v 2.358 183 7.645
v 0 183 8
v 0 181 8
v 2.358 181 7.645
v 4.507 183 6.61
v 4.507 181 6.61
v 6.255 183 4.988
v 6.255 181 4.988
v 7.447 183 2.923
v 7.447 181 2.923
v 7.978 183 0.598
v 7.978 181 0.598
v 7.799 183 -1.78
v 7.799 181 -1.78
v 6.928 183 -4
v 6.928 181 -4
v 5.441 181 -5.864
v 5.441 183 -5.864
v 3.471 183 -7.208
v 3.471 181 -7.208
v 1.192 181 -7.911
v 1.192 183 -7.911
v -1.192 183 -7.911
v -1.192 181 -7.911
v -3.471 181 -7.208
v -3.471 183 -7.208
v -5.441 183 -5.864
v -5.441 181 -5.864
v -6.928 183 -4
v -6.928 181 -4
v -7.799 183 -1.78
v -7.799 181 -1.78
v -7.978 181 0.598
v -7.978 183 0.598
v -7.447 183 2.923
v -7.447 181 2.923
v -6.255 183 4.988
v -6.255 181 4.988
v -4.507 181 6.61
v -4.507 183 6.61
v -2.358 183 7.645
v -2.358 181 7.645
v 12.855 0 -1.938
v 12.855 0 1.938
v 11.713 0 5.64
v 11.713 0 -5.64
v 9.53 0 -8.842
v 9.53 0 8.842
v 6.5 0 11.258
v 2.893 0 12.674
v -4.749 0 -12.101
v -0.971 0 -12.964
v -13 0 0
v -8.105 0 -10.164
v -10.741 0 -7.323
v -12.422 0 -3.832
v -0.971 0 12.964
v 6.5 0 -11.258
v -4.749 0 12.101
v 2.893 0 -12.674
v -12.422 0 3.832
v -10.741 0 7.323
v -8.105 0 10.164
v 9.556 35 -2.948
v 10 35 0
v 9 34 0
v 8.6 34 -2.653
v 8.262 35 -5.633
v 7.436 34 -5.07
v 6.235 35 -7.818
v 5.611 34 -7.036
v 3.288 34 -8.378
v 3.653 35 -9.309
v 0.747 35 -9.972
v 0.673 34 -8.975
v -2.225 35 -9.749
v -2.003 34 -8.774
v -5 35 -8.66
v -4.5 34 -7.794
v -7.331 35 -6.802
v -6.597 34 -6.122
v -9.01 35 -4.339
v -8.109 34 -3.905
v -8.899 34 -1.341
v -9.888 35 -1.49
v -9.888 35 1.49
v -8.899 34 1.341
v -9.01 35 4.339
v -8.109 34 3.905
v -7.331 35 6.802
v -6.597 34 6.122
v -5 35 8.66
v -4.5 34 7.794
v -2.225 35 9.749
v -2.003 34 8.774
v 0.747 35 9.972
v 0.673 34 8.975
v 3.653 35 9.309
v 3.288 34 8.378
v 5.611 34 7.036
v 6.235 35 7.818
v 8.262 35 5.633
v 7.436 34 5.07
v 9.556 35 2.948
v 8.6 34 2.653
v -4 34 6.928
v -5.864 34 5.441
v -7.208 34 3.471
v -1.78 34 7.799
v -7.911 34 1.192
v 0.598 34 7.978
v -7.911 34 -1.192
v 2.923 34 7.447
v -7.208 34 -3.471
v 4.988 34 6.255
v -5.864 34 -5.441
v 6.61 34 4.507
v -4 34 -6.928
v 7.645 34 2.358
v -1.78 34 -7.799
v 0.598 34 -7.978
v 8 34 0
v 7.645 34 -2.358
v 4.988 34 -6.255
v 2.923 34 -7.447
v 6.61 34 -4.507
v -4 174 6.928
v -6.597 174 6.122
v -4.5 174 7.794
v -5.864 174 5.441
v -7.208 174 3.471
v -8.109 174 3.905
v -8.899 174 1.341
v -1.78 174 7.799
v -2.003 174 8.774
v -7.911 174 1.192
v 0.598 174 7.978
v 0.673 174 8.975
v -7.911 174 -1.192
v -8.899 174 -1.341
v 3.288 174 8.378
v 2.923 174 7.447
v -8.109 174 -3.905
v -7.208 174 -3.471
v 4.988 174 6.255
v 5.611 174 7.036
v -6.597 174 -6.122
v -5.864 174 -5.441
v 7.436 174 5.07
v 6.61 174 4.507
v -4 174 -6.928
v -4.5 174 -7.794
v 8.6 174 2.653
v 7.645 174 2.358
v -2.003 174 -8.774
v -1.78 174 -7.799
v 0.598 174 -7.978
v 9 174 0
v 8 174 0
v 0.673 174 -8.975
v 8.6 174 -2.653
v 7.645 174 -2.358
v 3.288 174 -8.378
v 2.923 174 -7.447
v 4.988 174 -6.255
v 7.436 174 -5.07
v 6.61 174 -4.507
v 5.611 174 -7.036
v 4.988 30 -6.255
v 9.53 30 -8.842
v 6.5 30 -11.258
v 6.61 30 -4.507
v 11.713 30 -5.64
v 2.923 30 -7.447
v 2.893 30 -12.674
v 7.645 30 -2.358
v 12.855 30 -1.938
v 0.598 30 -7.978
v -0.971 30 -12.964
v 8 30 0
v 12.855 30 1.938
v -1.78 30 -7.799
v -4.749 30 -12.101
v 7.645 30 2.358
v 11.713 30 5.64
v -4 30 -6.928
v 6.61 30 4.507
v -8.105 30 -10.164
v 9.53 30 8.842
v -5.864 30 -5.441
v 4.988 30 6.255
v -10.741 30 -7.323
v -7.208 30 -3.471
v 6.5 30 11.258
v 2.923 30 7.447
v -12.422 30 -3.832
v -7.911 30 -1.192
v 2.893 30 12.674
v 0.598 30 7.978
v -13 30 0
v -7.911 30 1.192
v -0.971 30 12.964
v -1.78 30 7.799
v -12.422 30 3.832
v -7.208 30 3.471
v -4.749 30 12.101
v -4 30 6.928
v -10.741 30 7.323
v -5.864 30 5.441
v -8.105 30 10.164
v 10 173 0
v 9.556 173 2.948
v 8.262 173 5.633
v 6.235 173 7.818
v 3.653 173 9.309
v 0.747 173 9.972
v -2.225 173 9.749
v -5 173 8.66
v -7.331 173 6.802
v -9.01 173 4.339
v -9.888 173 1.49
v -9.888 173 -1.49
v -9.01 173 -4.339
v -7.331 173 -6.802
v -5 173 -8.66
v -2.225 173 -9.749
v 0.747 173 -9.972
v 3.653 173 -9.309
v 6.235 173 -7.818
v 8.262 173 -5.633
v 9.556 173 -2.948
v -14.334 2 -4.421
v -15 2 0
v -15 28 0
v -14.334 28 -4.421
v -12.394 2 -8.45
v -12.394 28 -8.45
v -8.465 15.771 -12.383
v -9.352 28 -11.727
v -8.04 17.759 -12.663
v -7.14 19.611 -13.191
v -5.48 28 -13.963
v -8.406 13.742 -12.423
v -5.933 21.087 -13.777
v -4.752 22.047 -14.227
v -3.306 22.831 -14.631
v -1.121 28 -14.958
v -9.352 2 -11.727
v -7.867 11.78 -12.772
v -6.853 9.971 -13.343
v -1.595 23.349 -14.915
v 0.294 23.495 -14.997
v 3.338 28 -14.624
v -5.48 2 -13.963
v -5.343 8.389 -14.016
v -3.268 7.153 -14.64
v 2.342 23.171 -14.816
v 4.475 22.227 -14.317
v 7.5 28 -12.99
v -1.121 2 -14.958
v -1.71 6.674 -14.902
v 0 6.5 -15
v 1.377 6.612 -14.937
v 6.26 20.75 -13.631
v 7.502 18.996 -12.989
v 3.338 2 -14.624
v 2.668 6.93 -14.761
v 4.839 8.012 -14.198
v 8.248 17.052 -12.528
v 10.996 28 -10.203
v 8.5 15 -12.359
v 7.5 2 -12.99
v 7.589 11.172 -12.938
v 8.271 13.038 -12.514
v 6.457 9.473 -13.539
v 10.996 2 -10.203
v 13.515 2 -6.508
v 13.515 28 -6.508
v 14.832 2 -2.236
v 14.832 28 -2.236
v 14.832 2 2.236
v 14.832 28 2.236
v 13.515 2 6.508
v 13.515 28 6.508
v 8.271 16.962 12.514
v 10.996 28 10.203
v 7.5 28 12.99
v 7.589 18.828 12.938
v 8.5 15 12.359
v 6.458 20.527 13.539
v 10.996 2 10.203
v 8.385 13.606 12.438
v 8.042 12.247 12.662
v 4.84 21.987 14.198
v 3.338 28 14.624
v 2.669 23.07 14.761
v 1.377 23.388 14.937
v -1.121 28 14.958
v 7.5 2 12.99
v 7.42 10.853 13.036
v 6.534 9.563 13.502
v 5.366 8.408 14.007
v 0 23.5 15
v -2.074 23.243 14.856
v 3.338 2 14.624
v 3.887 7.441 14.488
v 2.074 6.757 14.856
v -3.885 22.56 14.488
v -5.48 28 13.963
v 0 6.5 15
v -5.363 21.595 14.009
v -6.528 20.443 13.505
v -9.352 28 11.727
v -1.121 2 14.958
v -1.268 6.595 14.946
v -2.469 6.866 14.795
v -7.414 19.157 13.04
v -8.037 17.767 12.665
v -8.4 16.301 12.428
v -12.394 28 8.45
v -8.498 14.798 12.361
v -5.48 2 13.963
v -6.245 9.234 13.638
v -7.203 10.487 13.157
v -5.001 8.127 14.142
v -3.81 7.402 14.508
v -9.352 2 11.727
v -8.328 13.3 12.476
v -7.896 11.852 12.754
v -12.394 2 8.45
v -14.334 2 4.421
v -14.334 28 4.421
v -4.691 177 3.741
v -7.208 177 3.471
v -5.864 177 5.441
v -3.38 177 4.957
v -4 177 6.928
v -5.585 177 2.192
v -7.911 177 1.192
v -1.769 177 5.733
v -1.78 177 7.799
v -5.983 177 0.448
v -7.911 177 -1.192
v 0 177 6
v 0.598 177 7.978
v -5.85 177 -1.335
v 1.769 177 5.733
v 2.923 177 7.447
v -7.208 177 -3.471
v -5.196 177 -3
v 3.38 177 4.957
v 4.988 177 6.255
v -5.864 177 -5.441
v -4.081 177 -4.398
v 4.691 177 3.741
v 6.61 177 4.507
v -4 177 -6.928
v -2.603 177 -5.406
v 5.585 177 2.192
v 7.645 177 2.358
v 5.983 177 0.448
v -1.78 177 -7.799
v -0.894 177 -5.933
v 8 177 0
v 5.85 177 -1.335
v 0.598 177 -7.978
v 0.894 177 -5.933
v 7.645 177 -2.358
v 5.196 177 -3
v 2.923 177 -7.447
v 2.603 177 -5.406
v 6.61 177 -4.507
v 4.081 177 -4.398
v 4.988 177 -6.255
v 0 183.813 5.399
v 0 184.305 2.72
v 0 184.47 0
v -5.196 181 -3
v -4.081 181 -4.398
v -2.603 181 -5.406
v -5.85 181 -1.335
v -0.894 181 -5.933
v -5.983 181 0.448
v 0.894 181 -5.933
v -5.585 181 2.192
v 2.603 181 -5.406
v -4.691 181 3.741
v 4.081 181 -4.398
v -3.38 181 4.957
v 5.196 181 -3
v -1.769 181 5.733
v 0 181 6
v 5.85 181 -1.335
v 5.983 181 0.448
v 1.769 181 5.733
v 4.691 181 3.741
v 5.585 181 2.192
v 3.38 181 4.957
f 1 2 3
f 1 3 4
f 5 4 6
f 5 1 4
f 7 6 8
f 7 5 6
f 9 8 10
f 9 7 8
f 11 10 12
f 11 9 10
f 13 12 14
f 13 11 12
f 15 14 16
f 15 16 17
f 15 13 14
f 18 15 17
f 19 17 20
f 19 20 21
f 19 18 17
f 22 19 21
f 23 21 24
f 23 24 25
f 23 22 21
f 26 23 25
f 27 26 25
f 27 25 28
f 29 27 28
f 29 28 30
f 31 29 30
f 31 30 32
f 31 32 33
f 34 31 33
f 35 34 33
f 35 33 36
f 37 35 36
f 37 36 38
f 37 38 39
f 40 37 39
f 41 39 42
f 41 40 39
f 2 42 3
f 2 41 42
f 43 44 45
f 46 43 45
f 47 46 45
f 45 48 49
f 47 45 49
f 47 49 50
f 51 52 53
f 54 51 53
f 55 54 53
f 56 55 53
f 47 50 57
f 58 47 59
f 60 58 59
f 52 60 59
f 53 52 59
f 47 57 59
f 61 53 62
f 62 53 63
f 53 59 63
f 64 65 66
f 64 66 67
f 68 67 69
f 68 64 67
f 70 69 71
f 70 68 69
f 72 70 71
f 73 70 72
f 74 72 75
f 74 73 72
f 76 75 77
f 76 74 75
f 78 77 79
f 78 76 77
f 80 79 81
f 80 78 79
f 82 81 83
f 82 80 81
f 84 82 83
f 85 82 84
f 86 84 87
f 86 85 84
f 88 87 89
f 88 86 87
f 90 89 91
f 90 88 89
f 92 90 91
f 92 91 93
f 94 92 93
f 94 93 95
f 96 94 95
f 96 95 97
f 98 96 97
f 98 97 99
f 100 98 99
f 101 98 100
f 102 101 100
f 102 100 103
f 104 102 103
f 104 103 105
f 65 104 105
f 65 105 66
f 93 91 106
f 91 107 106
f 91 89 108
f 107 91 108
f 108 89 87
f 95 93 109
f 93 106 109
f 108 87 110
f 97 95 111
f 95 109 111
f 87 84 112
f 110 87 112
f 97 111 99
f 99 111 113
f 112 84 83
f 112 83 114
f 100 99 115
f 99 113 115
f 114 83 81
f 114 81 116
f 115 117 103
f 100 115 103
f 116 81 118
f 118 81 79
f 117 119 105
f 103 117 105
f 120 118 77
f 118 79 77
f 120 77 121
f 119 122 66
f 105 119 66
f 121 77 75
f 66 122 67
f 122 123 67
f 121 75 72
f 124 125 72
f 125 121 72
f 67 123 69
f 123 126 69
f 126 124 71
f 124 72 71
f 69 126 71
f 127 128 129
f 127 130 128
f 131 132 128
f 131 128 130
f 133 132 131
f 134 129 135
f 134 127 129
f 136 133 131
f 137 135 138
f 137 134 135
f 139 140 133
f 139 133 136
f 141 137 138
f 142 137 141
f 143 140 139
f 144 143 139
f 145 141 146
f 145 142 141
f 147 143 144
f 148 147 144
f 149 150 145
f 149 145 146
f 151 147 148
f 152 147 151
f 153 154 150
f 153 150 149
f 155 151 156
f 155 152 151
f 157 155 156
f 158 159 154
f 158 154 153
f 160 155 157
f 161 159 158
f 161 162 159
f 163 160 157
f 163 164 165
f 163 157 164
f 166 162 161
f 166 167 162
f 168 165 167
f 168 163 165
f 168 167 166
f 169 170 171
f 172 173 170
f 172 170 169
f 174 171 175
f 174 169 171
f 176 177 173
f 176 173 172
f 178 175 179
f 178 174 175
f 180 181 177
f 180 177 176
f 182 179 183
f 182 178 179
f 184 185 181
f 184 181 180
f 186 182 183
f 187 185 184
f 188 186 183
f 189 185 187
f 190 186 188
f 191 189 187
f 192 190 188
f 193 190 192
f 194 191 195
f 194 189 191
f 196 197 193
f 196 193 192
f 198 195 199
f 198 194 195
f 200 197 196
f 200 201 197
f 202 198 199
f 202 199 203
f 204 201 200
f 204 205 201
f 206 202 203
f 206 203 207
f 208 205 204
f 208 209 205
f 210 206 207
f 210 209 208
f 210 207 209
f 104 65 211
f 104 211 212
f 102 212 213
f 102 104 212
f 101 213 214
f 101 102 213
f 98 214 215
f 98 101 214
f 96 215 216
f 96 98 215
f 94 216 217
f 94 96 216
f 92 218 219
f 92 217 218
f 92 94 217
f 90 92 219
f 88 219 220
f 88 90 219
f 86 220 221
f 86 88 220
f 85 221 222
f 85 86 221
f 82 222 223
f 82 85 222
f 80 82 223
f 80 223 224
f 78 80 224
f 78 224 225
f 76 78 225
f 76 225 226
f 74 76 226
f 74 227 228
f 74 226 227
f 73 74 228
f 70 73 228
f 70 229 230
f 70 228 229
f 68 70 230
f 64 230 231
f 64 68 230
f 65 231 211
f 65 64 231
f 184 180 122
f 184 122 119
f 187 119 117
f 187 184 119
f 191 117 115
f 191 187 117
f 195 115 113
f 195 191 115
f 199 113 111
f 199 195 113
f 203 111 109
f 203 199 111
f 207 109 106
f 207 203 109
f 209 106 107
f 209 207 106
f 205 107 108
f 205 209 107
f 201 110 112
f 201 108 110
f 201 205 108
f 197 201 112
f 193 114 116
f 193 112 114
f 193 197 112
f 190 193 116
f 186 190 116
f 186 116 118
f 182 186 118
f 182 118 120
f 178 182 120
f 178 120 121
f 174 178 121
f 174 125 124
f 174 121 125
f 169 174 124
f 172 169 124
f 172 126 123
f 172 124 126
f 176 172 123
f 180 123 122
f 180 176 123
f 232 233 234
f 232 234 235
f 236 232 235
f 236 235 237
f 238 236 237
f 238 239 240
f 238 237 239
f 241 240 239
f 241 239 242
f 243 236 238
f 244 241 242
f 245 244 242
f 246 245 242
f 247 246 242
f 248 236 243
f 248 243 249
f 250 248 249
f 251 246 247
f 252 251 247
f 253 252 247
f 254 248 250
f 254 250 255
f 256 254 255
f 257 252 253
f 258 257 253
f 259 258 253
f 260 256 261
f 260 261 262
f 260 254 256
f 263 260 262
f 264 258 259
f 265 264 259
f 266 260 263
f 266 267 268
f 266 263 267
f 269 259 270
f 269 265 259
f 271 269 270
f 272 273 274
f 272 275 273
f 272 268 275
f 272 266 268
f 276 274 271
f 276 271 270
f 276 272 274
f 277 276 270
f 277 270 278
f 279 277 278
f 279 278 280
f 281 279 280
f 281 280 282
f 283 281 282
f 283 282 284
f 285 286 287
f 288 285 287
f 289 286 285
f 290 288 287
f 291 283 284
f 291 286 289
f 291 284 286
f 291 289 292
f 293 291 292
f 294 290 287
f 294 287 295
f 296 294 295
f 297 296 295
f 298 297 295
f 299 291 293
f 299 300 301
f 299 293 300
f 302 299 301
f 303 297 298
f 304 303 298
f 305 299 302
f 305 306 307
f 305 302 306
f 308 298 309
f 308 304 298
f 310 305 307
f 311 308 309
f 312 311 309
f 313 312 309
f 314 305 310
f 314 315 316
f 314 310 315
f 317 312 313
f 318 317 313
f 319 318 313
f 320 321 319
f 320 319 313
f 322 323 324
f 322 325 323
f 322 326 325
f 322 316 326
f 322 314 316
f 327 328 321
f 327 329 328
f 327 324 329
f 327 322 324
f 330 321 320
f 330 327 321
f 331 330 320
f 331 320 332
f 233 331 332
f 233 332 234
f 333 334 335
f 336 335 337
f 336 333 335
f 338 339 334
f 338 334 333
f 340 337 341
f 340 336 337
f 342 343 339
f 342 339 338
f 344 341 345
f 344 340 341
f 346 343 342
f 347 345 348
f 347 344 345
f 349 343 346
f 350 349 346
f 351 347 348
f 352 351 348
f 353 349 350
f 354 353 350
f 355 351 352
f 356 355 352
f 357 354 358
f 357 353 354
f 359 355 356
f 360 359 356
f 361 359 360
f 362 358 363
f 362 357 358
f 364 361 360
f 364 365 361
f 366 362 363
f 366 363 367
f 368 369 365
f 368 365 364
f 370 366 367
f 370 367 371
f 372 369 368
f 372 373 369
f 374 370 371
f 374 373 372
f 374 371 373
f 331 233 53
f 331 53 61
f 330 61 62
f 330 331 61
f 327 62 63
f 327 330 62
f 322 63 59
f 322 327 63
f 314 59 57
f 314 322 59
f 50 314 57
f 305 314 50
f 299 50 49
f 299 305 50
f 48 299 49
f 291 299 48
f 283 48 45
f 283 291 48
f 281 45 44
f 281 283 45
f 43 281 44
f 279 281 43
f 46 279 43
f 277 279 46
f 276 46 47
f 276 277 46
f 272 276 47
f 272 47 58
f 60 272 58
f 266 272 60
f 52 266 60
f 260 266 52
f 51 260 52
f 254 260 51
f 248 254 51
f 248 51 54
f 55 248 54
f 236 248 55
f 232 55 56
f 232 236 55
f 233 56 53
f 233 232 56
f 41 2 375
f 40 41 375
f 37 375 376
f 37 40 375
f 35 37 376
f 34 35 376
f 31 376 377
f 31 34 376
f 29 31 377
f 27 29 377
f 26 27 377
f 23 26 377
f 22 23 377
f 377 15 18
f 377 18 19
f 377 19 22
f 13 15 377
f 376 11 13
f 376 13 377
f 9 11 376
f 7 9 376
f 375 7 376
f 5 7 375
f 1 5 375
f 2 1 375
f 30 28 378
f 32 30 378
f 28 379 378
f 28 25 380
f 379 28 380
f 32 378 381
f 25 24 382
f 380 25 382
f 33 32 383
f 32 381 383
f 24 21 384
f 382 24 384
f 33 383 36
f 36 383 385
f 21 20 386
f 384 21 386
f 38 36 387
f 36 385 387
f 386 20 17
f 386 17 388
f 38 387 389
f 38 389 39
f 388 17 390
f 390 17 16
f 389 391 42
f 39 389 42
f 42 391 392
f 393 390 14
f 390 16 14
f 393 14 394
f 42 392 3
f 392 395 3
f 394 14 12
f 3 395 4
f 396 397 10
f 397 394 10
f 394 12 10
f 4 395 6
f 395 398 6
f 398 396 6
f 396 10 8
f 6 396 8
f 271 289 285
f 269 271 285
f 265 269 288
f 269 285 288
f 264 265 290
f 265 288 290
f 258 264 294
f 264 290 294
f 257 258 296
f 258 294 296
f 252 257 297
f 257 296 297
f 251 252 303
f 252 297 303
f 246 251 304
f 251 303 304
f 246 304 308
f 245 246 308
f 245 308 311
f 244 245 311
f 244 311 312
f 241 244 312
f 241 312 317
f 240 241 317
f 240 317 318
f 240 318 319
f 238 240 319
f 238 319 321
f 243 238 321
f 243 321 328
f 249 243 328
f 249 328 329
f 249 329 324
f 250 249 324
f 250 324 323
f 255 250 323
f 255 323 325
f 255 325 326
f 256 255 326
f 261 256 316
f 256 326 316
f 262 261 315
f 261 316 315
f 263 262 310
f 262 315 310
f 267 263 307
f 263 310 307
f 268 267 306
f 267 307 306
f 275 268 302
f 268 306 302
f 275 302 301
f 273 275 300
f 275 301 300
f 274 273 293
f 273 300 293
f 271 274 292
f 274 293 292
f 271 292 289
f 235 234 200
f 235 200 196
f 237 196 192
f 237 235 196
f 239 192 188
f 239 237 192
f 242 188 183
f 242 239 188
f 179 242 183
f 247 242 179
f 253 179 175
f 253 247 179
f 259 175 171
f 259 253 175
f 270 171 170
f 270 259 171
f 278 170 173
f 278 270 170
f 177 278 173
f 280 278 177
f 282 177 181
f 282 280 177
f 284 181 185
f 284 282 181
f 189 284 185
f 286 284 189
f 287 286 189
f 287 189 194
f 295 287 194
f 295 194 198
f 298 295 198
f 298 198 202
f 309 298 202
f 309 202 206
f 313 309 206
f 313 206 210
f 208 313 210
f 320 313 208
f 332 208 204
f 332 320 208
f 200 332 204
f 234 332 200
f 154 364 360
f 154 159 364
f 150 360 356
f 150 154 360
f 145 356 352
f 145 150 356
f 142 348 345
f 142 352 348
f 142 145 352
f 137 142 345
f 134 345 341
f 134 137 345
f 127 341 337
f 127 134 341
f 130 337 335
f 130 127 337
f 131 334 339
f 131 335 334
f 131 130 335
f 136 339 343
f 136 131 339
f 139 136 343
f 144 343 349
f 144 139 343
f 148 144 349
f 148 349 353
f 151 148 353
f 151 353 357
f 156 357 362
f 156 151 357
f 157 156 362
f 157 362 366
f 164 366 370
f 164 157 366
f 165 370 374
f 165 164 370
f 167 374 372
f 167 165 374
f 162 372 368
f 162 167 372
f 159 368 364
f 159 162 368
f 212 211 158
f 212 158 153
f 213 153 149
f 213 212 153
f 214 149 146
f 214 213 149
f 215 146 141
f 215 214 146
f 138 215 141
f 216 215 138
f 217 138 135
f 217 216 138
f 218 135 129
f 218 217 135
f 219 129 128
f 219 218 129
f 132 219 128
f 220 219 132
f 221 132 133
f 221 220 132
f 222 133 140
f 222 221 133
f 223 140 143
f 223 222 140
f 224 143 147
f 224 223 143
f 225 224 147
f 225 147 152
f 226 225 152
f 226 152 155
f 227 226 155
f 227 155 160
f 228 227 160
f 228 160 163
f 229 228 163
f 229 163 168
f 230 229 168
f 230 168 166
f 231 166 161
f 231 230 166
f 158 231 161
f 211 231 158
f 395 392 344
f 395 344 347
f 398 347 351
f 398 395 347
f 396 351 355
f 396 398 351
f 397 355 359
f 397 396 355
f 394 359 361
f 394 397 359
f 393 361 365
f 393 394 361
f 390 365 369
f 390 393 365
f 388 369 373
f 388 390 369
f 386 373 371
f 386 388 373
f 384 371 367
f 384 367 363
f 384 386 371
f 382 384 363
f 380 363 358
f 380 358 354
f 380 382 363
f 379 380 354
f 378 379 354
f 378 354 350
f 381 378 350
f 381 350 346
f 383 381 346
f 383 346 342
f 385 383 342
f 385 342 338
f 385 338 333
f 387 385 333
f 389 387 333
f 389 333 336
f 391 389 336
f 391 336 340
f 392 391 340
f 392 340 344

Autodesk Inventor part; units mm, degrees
ref_plane "YZ Plane" through (0, 0, 0) normal (1, 0, 0) x (0, 1, 0)
ref_plane "XZ Plane" through (0, 0, 0) normal (0, 1, 0) x (-1, 0, 0)
sketch "Sketch1" plane through (0, 0, 0) normal (0, 1, 0) x (-1, 0, 0)
  circle A0 centre (0, 0) radius 15
  dimension "d0" = 30
extrude "Extrusion1" add sketch "Sketch1" along normal blind 30
sketch "Sketch2" plane through (0, 30, 0) normal (0, 1, 0) x (1, 0, 0)
  circle A0 centre (0, 0) radius 8
  dimension "d3" = 16
extrude "Extrusion2" add sketch "Sketch2" along normal blind 4
sketch "Sketch3" plane through (0, 34, 0) normal (0, 1, 0) x (1, 0, 0)
  circle A0 centre (0, 0) radius 15 projected
  circle A1 centre (0, 0) radius 10
  dimension "d6" = 20
extrude "Extrusion3" add sketch "Sketch3" along normal blind 140 contours A1
sketch "Sketch4" plane through (0, 174, 0) normal (0, 1, 0) x (1, 0, 0)
  circle A0 centre (0, 0) radius 10 projected
  circle A1 centre (0, 0) radius 8
  dimension "d9" = 16
extrude "Extrusion4" add sketch "Sketch4" along normal blind 3 contours A1
sketch "Sketch5" plane through (0, 177, 0) normal (0, 1, 0) x (1, 0, 0)
  point P0 (0, 0)
sketch "Sketch6" plane through (0, 0, 0) normal (1, 0, 0) x (0, 1, 0)
  line L0 (177, -8) -> (177, 8) projected
  line L1 (177, 0) -> (183, 0)
  line L2 (0, 0) -> (-184.47, 0)
  line L3 (0, -15) -> (0, 15) projected
  line L4 (0, 0) -> (184.47, 0)
  line L5 (184.47, 0) -> (161.97, 0)
  circle A0 centre (161.97, 0) radius 22.5
  line L6 (177, 0) -> (177, 6)
  line L7 (177, 6) -> (181, 6)
  line L8 (181, 6) -> (181, 8)
  line L9 (181, 8) -> (182.9997, 8)
  dimension "d12" = 6
  dimension "d14" = 184.47
  dimension "d15" = 22.5
  dimension "d16" = 6
  dimension "d17" = 4
  dimension "d18" = 2
revolve "Revolution1" add sketch "Sketch6" angle 360 about axis through (0, 0, 0) along (0, 1, 0) contours L0 L7 L8 L9 A0 L4 L1
chamfer "Chamfer1" distance 2 angle 45 2 edges at (15, 0, 0) (15, 30, 0)
ref_plane "Work Plane1" through (0, 0, 15) normal (0, 0, 1) x (1, 0, 0)
sketch "Sketch7" plane through (0, 0, 15) normal (0, 0, 1) x (1, 0, 0)
  line L0 (0, 0) -> (0, 15)
  circle A0 centre (0, 15) radius 8.5
  dimension "d23" = 15
  dimension "d24" = 17
extrude "Extrusion5" cut sketch "Sketch7" against normal through all
thread "Thread1" size "M20x2.5" class "6g" standard "ANSI Metric M Profile" full length
chamfer "Chamfer2" distance 1 angle 45 1 edges at (-10, 174, 0)
chamfer "Chamfer3" distance 1 angle 45 1 edges at (-10, 34, 0)
properties part number "menetesorso"
